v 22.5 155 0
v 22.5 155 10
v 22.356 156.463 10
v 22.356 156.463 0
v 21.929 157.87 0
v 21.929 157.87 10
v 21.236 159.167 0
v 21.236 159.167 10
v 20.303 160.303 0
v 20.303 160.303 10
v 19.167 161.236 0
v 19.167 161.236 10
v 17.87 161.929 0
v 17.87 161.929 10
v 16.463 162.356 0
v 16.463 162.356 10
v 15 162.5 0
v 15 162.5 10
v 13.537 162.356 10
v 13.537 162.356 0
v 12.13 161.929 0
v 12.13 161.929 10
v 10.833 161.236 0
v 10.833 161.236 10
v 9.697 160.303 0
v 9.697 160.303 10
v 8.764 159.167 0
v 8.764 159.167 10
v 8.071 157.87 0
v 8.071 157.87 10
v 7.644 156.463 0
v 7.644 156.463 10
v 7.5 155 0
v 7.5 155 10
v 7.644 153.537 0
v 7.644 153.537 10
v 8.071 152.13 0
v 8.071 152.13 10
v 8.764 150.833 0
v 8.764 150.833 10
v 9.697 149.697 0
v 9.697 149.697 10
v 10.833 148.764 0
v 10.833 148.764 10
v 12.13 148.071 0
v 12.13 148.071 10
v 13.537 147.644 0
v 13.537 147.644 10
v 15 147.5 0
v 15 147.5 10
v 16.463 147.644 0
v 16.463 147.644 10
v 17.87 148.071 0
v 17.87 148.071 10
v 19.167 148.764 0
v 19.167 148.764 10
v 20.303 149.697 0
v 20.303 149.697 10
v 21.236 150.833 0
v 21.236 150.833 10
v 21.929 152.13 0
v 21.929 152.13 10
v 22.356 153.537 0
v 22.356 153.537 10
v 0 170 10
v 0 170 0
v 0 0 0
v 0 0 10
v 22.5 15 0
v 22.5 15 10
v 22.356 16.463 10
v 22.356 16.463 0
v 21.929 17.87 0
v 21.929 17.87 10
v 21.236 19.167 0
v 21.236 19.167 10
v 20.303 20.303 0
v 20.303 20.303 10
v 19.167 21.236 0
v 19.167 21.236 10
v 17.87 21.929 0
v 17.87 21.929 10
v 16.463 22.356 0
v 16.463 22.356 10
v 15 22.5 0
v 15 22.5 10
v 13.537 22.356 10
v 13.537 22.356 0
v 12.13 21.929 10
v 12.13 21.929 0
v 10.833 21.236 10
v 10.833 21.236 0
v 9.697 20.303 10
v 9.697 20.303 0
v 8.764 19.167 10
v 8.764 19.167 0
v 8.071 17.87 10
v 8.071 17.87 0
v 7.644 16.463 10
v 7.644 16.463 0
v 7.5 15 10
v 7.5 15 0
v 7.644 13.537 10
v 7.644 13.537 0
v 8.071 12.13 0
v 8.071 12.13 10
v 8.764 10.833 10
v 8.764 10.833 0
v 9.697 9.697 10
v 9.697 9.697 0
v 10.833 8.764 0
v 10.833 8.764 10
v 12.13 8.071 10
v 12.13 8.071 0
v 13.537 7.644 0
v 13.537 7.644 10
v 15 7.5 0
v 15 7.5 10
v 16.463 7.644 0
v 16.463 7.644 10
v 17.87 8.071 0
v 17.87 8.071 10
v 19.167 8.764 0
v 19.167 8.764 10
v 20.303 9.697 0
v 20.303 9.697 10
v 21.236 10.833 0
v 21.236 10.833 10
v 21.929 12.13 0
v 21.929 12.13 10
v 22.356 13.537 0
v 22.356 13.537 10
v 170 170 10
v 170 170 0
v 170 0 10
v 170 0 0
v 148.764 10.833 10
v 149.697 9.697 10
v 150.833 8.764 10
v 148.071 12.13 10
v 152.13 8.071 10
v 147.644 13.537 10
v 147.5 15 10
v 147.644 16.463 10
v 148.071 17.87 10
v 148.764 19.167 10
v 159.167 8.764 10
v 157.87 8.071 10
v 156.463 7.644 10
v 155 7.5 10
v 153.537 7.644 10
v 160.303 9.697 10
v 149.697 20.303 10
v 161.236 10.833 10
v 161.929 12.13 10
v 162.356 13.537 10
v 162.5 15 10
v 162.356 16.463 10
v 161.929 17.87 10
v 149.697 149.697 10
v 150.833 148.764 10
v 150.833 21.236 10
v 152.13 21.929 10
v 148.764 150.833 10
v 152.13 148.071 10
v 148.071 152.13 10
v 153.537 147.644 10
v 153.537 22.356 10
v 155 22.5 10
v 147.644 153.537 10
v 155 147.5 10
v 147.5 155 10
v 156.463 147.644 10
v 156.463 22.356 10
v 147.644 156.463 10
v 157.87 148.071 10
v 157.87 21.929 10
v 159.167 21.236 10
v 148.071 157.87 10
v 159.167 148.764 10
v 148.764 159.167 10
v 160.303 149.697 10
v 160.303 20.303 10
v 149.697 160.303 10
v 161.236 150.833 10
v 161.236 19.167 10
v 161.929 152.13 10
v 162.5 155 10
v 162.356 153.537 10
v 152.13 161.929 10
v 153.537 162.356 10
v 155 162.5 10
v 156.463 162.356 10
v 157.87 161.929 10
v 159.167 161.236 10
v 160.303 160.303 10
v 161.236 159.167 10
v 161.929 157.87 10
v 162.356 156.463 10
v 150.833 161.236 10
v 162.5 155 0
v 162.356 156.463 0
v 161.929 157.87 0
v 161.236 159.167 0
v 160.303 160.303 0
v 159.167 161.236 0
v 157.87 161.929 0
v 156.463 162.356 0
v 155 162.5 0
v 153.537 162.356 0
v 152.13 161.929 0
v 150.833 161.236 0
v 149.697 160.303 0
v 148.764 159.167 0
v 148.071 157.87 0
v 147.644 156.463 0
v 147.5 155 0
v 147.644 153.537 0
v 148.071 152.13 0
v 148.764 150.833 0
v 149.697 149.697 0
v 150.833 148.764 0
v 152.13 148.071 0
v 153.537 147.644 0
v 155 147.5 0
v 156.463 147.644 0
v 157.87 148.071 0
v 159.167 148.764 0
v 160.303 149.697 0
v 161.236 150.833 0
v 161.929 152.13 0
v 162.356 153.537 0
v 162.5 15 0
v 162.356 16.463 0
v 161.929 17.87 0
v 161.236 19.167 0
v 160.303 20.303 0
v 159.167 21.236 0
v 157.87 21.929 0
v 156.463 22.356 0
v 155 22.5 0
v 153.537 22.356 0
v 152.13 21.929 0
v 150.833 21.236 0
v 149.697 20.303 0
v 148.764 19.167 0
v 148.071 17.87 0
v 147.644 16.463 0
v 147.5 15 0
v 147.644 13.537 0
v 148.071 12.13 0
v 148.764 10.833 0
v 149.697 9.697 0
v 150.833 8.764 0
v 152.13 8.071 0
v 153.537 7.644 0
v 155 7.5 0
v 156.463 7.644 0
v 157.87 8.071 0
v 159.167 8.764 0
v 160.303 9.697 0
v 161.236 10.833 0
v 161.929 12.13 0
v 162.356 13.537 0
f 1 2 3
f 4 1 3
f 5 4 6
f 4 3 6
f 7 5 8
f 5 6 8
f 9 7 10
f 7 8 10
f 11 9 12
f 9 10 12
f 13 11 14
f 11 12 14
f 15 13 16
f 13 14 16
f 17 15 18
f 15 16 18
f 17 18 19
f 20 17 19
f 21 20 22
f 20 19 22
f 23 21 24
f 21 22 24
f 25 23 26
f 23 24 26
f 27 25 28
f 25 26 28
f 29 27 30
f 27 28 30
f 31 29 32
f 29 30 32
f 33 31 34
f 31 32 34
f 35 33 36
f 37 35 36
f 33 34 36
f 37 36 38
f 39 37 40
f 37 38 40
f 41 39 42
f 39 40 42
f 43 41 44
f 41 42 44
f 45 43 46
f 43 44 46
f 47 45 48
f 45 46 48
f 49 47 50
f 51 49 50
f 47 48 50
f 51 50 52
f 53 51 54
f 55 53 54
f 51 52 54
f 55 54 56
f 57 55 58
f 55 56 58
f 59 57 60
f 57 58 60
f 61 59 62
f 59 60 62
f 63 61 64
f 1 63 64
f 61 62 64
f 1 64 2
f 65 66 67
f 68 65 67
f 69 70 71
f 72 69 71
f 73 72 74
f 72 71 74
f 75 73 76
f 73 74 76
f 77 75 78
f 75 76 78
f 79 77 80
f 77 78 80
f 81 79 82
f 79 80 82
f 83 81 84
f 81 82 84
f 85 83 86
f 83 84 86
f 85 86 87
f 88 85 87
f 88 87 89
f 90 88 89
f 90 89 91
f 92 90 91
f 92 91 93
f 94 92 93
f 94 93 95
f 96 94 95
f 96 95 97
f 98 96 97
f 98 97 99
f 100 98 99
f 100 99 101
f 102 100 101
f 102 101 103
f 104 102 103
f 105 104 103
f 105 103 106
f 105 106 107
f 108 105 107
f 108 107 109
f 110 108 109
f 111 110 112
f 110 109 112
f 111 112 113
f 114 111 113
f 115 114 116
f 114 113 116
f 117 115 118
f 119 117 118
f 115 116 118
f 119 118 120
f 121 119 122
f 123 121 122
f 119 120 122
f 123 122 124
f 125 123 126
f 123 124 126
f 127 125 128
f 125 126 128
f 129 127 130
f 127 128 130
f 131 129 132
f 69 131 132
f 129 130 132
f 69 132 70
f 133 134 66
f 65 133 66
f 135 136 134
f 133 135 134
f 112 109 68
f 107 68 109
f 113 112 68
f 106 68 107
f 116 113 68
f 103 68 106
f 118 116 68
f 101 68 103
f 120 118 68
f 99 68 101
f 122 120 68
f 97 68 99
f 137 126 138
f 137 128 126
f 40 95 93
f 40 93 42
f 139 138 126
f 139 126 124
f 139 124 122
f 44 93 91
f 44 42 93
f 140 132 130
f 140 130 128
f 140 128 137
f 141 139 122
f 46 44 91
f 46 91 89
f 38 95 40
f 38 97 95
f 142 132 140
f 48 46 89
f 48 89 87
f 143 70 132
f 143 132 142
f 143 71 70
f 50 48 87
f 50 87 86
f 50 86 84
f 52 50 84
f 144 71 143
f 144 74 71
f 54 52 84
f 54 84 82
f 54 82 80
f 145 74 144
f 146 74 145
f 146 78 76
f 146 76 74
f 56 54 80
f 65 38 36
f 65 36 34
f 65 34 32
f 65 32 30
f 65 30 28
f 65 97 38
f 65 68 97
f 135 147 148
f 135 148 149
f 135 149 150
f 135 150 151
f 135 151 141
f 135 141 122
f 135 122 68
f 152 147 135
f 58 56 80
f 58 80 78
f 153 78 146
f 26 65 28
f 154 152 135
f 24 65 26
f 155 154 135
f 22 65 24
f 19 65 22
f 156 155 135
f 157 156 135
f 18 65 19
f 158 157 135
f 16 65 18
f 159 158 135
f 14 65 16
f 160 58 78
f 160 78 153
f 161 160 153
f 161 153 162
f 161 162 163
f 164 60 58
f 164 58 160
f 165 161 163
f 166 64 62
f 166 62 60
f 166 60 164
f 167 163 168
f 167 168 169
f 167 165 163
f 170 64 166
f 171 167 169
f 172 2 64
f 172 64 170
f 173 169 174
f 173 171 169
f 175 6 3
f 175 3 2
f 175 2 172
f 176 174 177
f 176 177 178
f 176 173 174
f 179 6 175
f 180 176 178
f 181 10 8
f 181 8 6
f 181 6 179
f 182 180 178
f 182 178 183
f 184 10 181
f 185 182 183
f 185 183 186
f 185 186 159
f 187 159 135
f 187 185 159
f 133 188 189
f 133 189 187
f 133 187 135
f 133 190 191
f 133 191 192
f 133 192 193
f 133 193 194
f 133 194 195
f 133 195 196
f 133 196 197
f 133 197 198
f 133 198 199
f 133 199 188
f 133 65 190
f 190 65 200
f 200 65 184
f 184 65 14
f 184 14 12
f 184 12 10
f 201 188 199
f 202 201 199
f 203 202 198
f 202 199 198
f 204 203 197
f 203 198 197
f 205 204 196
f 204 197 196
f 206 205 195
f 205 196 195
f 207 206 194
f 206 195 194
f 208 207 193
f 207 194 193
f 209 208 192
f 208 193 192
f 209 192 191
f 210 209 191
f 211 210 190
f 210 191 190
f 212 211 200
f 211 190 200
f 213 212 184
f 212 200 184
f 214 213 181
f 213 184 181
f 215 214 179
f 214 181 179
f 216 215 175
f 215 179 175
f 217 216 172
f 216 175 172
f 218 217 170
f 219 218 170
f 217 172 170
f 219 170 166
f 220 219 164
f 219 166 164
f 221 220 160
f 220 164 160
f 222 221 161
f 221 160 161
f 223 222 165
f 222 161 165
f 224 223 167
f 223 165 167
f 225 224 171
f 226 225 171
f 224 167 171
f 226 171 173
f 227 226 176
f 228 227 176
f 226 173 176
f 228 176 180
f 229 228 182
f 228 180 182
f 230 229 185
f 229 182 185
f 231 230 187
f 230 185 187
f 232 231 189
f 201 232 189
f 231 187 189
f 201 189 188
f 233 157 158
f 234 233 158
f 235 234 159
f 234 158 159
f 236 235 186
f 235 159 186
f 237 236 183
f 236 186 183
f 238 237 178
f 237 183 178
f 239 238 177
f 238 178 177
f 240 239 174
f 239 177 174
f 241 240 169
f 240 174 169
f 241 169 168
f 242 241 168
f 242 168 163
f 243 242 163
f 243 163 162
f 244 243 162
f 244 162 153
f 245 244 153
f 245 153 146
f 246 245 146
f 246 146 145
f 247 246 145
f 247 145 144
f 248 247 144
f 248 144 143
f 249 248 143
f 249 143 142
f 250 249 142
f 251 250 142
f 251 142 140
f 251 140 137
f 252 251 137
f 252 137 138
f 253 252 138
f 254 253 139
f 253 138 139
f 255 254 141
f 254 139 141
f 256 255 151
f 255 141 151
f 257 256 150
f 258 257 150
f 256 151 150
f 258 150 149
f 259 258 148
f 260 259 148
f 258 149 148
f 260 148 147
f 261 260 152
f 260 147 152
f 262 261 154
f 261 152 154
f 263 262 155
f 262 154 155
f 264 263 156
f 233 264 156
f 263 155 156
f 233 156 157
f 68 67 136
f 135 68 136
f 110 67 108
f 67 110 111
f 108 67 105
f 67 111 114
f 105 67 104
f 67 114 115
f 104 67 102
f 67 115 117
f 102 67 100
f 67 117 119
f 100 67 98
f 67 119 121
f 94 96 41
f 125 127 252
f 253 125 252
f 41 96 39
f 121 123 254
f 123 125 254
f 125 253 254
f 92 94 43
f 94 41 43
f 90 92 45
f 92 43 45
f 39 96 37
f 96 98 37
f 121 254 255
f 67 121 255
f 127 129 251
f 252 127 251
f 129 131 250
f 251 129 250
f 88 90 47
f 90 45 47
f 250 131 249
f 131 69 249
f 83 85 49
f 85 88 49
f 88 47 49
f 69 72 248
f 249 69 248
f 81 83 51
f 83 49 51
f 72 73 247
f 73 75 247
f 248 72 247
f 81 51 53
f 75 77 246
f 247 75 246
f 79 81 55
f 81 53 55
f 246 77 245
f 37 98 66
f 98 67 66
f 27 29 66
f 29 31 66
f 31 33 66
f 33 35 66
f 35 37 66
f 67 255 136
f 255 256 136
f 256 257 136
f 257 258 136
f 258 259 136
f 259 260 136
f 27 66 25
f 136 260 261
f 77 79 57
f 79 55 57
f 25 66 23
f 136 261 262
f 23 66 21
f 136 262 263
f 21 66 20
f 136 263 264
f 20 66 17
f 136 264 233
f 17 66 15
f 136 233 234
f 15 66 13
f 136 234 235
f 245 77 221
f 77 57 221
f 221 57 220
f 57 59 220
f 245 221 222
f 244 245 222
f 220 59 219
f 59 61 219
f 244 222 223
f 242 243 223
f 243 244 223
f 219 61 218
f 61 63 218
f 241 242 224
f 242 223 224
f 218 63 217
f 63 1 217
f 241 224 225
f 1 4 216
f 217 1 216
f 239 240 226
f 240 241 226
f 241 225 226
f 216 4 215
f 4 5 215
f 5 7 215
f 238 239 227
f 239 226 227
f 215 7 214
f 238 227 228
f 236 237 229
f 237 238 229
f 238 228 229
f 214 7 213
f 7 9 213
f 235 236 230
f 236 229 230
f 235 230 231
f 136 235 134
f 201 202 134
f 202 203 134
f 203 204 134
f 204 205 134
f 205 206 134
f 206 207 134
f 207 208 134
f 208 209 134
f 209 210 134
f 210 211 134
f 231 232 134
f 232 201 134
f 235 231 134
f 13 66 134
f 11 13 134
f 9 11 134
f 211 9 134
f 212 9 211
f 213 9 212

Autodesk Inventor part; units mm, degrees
ref_plane "YZ Plane" through (0, 0, 0) normal (1, 0, 0) x (0, 1, 0)
ref_plane "XZ Plane" through (0, 0, 0) normal (0, 1, 0) x (-1, 0, 0)
ref_plane "XY Plane" through (0, 0, 0) normal (0, 0, 1) x (1, 0, 0)
sketch "Sketch1" plane through (0, 0, 0) normal (0, 0, 1) x (1, 0, 0)
  line L0 (0, 0) -> (170, 0)
  line L1 (170, 0) -> (170, 170)
  line L2 (170, 170) -> (0, 170)
  line L3 (0, 170) -> (0, 0)
  dimension "d0" = 170
  dimension "d1" = 170
extrude "Extrusion1" add sketch "Sketch1" along normal blind 10
sketch "Sketch2" plane through (0, 0, 10) normal (0, 0, 1) x (1, 0, 0)
  line L0 (170, 170) -> (0, 170) projected
  line L1 (0, 170) -> (0, 155)
  line L2 (0, 170) -> (0, 0) projected
  line L3 (0, 0) -> (170, 0) projected
  line L4 (0, 0) -> (0, 15)
  line L5 (0, 15) -> (155, 15)
  line L6 (155, 15) -> (155, 155)
  line L7 (155, 155) -> (15, 155)
  line L8 (15, 155) -> (15, 15)
  line L9 (15, 155) -> (30, 155)
  circle A0 centre (15, 155) radius 7.5
  circle A1 centre (155, 155) radius 7.5
  circle A2 centre (155, 15) radius 7.5
  circle A3 centre (15, 15) radius 7.5
  dimension "d4" = 15
  dimension "d5" = 15
  dimension "d6" = 155
  dimension "d7" = 140
  dimension "d8" = 140
  dimension "d9" = 140
  dimension "d10" = 15
  dimension "d11" = 15
  dimension "d12" = 15
  dimension "d13" = 15
extrude "Extrusion2" cut sketch "Sketch2" against normal blind 10 contours L8 A3 L5 | L5 A3 | L5 A3 L8 | A2 L6 L5 | L5 L6 A2 | A0 L7 L8 | L8 L7 A0 | A1 L7 L6 | L6 L7 A1
properties part number "AF"
